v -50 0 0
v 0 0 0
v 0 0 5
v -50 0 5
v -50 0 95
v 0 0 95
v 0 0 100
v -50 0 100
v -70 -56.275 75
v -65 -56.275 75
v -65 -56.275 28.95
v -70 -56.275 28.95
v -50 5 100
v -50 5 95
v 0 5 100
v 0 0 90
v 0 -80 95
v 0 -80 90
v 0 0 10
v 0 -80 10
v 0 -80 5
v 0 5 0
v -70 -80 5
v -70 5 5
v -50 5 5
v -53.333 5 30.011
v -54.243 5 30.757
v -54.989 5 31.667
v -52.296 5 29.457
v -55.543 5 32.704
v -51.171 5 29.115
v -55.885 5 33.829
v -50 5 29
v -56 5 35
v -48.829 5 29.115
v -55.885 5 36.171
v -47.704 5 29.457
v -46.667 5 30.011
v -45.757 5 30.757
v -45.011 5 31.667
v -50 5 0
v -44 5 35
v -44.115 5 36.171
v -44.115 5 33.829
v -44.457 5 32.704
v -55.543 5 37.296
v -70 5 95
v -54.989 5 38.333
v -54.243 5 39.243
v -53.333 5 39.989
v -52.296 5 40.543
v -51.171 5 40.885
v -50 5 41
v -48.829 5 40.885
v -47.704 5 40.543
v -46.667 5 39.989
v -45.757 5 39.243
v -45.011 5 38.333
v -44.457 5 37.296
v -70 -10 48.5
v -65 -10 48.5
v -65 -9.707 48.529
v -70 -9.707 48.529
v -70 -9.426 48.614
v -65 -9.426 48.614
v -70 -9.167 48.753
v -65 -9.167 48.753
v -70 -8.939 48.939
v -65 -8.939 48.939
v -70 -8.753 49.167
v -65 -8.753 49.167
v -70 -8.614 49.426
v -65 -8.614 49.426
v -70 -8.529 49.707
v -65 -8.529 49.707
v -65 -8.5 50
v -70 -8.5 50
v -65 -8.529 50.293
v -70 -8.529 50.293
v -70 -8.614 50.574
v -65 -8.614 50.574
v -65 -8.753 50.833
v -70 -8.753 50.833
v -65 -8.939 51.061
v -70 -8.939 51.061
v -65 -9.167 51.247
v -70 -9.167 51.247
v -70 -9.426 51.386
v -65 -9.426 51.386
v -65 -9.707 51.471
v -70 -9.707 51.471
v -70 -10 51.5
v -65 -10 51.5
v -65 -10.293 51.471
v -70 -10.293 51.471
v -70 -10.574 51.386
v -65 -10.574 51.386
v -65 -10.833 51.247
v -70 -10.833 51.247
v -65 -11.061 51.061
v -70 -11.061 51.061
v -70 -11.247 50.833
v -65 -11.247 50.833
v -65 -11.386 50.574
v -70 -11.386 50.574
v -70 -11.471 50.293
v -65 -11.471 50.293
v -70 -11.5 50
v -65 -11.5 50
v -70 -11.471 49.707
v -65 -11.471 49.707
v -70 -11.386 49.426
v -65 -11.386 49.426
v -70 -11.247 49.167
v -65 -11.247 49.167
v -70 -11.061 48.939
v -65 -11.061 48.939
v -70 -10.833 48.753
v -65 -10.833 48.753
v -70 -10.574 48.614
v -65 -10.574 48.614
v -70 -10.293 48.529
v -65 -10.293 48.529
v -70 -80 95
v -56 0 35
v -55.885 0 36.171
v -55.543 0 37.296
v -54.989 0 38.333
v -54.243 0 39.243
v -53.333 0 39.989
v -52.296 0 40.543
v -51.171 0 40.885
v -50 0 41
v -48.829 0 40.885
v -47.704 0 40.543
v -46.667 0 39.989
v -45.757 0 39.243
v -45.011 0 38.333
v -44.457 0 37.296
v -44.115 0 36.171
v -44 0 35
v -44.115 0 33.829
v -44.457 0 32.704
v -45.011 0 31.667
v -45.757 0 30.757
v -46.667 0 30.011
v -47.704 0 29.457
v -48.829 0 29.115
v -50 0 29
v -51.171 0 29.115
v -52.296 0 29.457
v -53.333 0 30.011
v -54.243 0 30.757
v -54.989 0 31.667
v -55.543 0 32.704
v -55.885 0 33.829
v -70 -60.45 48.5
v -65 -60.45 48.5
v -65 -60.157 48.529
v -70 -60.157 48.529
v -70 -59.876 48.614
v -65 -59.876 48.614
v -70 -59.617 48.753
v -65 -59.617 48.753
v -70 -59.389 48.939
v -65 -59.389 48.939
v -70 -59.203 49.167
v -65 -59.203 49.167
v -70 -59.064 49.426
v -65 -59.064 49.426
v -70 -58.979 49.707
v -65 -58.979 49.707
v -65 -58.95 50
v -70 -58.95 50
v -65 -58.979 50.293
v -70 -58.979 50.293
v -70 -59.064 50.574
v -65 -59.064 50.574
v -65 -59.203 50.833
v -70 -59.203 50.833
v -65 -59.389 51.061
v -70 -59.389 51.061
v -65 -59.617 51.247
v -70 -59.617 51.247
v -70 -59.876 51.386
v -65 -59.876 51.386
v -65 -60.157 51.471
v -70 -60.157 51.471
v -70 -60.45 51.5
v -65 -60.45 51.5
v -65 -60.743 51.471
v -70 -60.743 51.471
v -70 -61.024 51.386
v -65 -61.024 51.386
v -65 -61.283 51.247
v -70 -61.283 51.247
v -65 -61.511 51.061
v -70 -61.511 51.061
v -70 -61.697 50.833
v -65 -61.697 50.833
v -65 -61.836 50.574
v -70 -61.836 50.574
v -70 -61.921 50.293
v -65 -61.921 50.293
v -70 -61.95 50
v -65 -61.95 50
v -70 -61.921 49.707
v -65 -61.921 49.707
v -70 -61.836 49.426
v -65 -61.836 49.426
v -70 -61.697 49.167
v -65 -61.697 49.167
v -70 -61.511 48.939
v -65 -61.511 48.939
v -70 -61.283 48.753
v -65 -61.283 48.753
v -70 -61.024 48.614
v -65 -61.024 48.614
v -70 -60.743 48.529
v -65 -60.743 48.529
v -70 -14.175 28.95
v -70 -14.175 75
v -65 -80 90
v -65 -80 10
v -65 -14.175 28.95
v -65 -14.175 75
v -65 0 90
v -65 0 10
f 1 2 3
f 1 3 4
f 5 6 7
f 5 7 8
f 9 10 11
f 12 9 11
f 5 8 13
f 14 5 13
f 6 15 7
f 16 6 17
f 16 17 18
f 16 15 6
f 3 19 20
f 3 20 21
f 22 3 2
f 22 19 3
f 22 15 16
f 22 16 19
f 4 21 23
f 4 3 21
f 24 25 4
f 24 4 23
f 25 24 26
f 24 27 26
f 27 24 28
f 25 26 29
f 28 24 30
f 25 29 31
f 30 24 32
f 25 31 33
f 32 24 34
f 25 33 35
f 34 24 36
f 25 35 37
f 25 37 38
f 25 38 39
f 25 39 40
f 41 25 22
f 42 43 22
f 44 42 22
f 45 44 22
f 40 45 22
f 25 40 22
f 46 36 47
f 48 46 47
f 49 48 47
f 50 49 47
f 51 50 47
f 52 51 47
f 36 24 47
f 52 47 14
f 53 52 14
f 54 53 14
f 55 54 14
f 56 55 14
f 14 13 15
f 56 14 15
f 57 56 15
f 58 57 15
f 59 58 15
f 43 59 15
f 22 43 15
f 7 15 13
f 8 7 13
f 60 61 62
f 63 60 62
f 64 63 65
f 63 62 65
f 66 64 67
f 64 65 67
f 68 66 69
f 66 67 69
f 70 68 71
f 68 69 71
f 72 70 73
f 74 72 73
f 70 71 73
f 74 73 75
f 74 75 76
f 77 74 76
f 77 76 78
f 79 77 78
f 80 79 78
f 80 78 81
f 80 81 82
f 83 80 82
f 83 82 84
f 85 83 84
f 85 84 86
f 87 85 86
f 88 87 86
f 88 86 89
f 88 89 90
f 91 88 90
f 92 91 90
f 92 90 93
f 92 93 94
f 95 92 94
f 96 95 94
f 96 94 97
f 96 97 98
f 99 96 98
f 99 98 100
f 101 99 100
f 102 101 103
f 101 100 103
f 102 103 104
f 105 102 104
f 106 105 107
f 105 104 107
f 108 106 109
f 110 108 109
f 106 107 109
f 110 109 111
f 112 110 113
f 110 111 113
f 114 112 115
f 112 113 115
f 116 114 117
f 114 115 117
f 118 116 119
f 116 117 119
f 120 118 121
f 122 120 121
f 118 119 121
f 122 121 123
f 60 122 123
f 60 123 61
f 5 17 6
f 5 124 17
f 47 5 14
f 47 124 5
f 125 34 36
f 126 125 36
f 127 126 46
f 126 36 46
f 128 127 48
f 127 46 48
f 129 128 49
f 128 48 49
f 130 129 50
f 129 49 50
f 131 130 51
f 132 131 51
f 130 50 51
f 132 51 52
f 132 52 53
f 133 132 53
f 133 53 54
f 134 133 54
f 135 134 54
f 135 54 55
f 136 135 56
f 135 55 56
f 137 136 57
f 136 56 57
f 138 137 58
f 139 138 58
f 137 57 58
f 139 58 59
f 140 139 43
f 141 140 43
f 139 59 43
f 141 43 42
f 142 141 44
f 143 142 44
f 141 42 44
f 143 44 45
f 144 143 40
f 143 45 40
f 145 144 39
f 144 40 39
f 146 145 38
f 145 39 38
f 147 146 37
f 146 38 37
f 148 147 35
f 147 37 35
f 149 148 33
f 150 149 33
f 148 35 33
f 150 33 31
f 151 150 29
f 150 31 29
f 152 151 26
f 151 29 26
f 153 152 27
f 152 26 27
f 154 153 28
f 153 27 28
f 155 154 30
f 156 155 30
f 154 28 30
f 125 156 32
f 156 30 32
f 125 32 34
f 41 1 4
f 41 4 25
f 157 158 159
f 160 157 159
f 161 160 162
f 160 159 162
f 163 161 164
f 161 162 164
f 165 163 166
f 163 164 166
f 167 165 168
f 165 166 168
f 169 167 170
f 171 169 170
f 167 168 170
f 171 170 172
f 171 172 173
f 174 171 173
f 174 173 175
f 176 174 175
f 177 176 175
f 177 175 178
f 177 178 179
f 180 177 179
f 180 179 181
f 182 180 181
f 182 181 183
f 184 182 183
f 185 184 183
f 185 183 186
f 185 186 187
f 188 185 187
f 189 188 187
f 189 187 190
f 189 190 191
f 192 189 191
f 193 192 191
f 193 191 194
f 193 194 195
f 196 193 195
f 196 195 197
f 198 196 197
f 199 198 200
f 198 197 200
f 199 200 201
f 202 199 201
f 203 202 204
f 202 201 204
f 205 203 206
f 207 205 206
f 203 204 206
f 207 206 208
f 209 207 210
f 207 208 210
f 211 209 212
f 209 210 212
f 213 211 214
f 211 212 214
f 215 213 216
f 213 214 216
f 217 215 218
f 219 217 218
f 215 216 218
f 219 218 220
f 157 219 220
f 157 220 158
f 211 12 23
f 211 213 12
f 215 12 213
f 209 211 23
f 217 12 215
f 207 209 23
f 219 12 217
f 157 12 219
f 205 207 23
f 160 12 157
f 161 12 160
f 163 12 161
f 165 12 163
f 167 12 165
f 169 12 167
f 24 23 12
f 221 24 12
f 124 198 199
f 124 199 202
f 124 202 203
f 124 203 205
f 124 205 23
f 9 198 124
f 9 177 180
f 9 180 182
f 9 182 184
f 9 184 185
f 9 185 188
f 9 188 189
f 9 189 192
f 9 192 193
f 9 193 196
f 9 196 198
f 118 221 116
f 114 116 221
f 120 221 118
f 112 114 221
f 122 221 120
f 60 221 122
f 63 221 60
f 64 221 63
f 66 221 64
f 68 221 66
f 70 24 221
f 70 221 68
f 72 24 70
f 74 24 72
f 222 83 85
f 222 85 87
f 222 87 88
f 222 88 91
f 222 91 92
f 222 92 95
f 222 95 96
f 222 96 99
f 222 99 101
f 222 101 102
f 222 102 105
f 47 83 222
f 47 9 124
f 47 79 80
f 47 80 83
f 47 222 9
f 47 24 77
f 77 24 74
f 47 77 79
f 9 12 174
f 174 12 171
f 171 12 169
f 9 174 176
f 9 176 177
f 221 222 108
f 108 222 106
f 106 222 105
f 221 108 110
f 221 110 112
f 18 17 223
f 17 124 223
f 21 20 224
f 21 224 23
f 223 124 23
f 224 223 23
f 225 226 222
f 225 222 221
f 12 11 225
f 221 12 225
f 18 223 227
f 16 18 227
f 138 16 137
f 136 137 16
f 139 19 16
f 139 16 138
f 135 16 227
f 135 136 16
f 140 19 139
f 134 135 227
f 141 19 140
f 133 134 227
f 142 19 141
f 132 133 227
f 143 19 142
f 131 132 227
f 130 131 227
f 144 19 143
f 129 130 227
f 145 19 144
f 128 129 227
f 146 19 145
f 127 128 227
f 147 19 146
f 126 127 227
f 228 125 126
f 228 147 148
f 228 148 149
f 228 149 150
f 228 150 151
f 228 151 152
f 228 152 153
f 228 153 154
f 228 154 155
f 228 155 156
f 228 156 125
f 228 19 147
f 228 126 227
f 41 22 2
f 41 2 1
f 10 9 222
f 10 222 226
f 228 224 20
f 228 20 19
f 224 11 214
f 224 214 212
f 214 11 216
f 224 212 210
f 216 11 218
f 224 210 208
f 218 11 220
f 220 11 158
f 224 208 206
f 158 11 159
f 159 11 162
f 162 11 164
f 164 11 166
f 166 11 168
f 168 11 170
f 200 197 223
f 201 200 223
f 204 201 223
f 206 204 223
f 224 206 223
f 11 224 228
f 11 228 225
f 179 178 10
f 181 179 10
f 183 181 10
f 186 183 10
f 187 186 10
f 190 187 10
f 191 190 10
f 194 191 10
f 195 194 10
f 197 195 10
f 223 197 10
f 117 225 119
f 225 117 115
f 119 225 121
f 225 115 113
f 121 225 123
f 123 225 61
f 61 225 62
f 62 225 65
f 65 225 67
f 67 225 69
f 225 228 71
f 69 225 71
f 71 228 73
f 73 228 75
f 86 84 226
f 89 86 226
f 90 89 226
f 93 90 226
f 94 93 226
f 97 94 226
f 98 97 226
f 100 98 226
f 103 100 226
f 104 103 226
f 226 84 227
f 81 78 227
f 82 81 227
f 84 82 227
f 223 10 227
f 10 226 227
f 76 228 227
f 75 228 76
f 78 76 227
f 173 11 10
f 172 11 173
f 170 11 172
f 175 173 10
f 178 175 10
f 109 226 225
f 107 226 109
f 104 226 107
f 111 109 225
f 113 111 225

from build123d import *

# Parameters (mm, degrees)
BOSS_EXTRUDE1_DEPTH = 100
SKETCH2_W           = 5
SKETCH2_H           = 80
CUT_EXTRUDE2_DEPTH  = 5
SKETCH3_W           = 5
SKETCH3_H           = 80
CUT_EXTRUDE3_DEPTH  = 5
SKETCH4_W           = 15
SKETCH4_H           = 5
CUT_EXTRUDE4_DEPTH  = 5
SKETCH5_W           = 15
SKETCH5_H           = 5
CUT_EXTRUDE5_DEPTH  = 5
SKETCH6_R           = 1.5
CUT_EXTRUDE6_DEPTH  = 10
SKETCH7_W           = 66.05
SKETCH7_H           = 42.1
CUT_EXTRUDE7_DEPTH  = 10
SKETCH8_W           = 5
SKETCH8_H           = 20
BOSS_EXTRUDE2_DEPTH = 42.1
SKETCH10_R          = 6
CUT_EXTRUDE8_DEPTH  = 5
SKETCH11_W          = 5
SKETCH11_H          = 25
CUT_EXTRUDE9_DEPTH  = 100
SKETCH12_W          = 5
SKETCH12_H          = 5
CUT_EXTRUDE10_DEPTH = 5
SKETCH13_W          = 5
SKETCH13_H          = 5
CUT_EXTRUDE11_DEPTH = 5
SKETCH14_W          = 5
SKETCH14_H          = 80
BOSS_EXTRUDE3_DEPTH = 65


with BuildPart() as part:
    # Sketch1 → Boss-Extrude1 (new body)
    with BuildSketch(Plane.XY):
        Polygon((0, 0), (-65, 0), (-65, -80), (-70, -80), (-70, 0), (-70, 30), (-65, 30), (-65, 5), (0, 5), align=None)
    extrude(amount=BOSS_EXTRUDE1_DEPTH)

    # Sketch2 → Cut-Extrude2 (cut)
    with BuildSketch(Plane.XY.offset(100)):
        with Locations((-67.5, -40)):
            Rectangle(SKETCH2_W, SKETCH2_H)
    extrude(amount=-CUT_EXTRUDE2_DEPTH, mode=Mode.SUBTRACT)

    # Sketch3 → Cut-Extrude3 (cut)
    with BuildSketch(Plane(origin=(0, 0, 0), x_dir=(-1, 0, 0), z_dir=(0, 0, -1))):
        with Locations((67.5, -40)):
            Rectangle(SKETCH3_W, SKETCH3_H)
    extrude(amount=-CUT_EXTRUDE3_DEPTH, mode=Mode.SUBTRACT)

    # Sketch4 → Cut-Extrude4 (cut)
    with BuildSketch(Plane.XY.offset(100)):
        with Locations((-57.5, 2.5)):
            Rectangle(SKETCH4_W, SKETCH4_H)
    extrude(amount=-CUT_EXTRUDE4_DEPTH, mode=Mode.SUBTRACT)

    # Sketch5 → Cut-Extrude5 (cut)
    with BuildSketch(Plane(origin=(0, 0, 0), x_dir=(-1, 0, 0), z_dir=(0, 0, -1))):
        with Locations((57.5, 2.5)):
            Rectangle(SKETCH5_W, SKETCH5_H)
    extrude(amount=-CUT_EXTRUDE5_DEPTH, mode=Mode.SUBTRACT)

    # Sketch6 → Cut-Extrude6 (cut)
    with BuildSketch(Plane(origin=(-65, 0, 0), x_dir=(0, 0, -1), z_dir=(1, 0, 0))):
        with Locations((-50, -10)):
            Circle(SKETCH6_R)
        with Locations((-50, -60.45)):
            Circle(SKETCH6_R)
    extrude(amount=-CUT_EXTRUDE6_DEPTH, mode=Mode.SUBTRACT)

    # Sketch7 → Cut-Extrude7 (cut)
    with BuildSketch(Plane(origin=(-65, 0, 0), x_dir=(0, 0, -1), z_dir=(1, 0, 0))):
        with Locations((-61.975, -35.225)):
            Rectangle(SKETCH7_W, SKETCH7_H)
    extrude(amount=-CUT_EXTRUDE7_DEPTH, mode=Mode.SUBTRACT)

    # Sketch8 → Boss-Extrude2 (add)
    with BuildSketch(Plane.XZ.offset(14.175)):
        with Locations((-67.5, 85)):
            Rectangle(SKETCH8_W, SKETCH8_H)
    extrude(amount=BOSS_EXTRUDE2_DEPTH)

    # Sketch10 → Cut-Extrude8 (cut)
    with BuildSketch(Plane(origin=(0, 5, 0), x_dir=(1, 0, 0), z_dir=(0, 1, 0))):
        with Locations(Location((-50, -35, 0), (0, 0, 180))):
            Circle(SKETCH10_R)
    extrude(amount=-CUT_EXTRUDE8_DEPTH, mode=Mode.SUBTRACT)

    # Sketch11 → Cut-Extrude9 (cut)
    with BuildSketch(Plane.XY.offset(100)):
        with Locations((-67.5, 17.5)):
            Rectangle(SKETCH11_W, SKETCH11_H)
    extrude(amount=-CUT_EXTRUDE9_DEPTH, mode=Mode.SUBTRACT)

    # Sketch12 → Cut-Extrude10 (cut)
    with BuildSketch(Plane.XY.offset(100)):
        with Locations((-67.5, 2.5)):
            Rectangle(SKETCH12_W, SKETCH12_H)
    extrude(amount=-CUT_EXTRUDE10_DEPTH, mode=Mode.SUBTRACT)

    # Sketch13 → Cut-Extrude11 (cut)
    with BuildSketch(Plane(origin=(0, 0, 0), x_dir=(-1, 0, 0), z_dir=(0, 0, -1))):
        with Locations((67.5, 2.5)):
            Rectangle(SKETCH13_W, SKETCH13_H)
    extrude(amount=-CUT_EXTRUDE11_DEPTH, mode=Mode.SUBTRACT)

    # Sketch14 → Boss-Extrude3 (add)
    with BuildSketch(Plane(origin=(-65, 0, 0), x_dir=(0, 0, -1), z_dir=(1, 0, 0))):
        with Locations((-92.5, -40)):
            Rectangle(SKETCH14_W, SKETCH14_H)
        with Locations((-7.5, -40)):
            Rectangle(SKETCH14_W, SKETCH14_H)
    extrude(amount=BOSS_EXTRUDE3_DEPTH)


solid = part.part
